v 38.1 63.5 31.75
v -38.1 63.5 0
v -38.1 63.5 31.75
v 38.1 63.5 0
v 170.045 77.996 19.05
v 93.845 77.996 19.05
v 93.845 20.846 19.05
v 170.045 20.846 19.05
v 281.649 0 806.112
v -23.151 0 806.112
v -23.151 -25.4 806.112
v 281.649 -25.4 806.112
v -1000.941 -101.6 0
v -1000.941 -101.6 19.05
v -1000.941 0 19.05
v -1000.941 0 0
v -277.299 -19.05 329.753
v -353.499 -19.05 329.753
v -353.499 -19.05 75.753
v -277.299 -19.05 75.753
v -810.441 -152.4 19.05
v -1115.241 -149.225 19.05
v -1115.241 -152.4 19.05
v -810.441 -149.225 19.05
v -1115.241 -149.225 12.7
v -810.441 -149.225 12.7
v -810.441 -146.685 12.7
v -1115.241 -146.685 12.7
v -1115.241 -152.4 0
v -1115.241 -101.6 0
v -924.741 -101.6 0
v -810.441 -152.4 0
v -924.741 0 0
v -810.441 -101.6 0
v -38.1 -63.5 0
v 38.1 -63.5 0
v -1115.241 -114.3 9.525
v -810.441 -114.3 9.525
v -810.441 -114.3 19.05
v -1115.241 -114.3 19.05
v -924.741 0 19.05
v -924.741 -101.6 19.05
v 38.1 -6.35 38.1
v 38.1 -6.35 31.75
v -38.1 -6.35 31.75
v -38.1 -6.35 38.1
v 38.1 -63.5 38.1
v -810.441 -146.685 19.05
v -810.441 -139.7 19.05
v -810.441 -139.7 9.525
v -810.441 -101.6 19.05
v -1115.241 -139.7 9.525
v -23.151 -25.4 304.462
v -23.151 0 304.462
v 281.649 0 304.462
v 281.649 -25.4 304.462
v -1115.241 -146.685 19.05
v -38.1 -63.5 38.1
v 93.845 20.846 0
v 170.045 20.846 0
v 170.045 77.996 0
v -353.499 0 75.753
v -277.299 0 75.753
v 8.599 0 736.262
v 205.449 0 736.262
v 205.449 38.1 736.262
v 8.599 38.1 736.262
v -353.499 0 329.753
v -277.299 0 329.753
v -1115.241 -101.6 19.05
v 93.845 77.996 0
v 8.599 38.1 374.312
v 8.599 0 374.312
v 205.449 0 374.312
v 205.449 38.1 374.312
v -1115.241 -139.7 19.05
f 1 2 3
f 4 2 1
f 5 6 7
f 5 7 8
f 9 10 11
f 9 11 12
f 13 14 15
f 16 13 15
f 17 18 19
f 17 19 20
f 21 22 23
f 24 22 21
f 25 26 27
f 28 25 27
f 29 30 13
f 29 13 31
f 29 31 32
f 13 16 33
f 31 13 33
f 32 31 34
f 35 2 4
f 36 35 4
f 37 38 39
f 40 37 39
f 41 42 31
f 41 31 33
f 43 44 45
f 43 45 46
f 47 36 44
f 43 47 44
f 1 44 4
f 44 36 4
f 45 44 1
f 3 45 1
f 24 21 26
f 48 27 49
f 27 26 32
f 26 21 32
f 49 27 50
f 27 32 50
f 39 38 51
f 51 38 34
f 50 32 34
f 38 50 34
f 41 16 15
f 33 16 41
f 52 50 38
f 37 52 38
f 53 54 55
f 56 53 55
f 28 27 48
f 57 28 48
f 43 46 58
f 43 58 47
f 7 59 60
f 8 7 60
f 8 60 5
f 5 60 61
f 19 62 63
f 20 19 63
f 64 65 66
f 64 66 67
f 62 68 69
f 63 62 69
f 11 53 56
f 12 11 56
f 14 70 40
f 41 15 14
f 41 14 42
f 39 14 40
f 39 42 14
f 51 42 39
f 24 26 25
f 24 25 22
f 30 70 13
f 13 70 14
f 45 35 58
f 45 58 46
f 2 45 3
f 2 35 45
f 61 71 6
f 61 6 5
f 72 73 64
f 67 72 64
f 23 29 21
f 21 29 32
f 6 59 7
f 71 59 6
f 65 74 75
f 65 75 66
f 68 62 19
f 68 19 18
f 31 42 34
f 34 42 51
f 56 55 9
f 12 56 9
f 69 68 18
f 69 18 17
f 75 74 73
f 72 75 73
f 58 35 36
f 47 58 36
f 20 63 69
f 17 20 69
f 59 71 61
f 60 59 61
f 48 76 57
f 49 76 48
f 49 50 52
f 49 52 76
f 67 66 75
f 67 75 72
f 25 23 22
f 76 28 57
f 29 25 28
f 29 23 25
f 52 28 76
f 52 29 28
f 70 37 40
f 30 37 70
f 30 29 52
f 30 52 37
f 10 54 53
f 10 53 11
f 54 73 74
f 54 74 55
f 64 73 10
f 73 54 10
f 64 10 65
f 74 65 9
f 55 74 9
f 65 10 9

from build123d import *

# Parameters (mm, degrees)
F0_W      = 76.2
F0_H      = 127
F1_DEPTH  = 38.1
F2_W      = 69.85
F2_H      = 6.35
F3_DEPTH  = 76.2
F4_DEPTH  = 76.2
F5_W      = 76.2
F5_H      = 57.15
F6_DEPTH  = 19.05
F7_W      = 304.8
F7_H      = 152.4
F8_DEPTH  = 19.05
F9_W      = 114.3
F9_H      = 101.6
F10_DEPTH = 19.05
F11_W     = 2.54
F11_H     = 6.35
F11_W_2   = 25.4
F11_H_2   = 9.525
F12_DEPTH = 304.8
F13_W     = 76.2
F13_H     = 254
F14_DEPTH = 19.05
F15_W     = 304.8
F15_H     = 501.65
F16_DEPTH = 25.4
F17_W     = 196.85
F17_H     = 361.95
F18_DEPTH = 38.1


with BuildPart() as f1:
    # F0 (on Top) → F1 (new body)
    with BuildSketch(Plane.XY):
        Rectangle(F0_W, F0_H)
    extrude(amount=F1_DEPTH)

    # F2 (on face) → F3 (join, through all)
    with BuildSketch(Plane.YZ.offset(38.1)):
        with Locations((28.575, 34.925)):
            Rectangle(F2_W, F2_H)
    extrude(amount=-F3_DEPTH)

    # F2 (on face) → F4 (cut, through all)
    with BuildSketch(Plane.YZ.offset(38.1)):
        with Locations((28.575, 34.925)):
            Rectangle(F2_W, F2_H)
    extrude(amount=-F4_DEPTH, mode=Mode.SUBTRACT)


with BuildPart() as f6:
    # F5 (on Top) → F6 (new body)
    with BuildSketch(Plane.XY):
        with Locations((131.945428, 49.421202)):
            Rectangle(F5_W, F5_H)
    extrude(amount=F6_DEPTH)


with BuildPart() as f8:
    # F7 (on Top) → F8 (new body)
    with BuildSketch(Plane.XY):
        with Locations((-962.84058, -76.2)):
            Rectangle(F7_W, F7_H)
    extrude(amount=F8_DEPTH)

    # F9 (on face) → F10 (cut, through all)
    with BuildSketch(Plane.XY.offset(19.05)):
        with Locations((-867.59058, -50.8)):
            Rectangle(F9_W, F9_H)
        with Locations((-1058.09058, -50.8)):
            Rectangle(F9_W, F9_H)
    extrude(amount=-F10_DEPTH, mode=Mode.SUBTRACT)

    # F11 (on face) → F12 (cut, through all)
    with BuildSketch(Plane.YZ.offset(-810.44058)):
        with Locations((-147.955, 15.875)):
            Rectangle(F11_W, F11_H)
        with Locations((-127, 14.2875)):
            Rectangle(F11_W_2, F11_H_2)
    extrude(amount=-F12_DEPTH, mode=Mode.SUBTRACT)


with BuildPart() as f14:
    # F13 (on Front) → F14 (new body)
    with BuildSketch(Plane.XZ):
        with Locations((-315.398529, 202.753096)):
            Rectangle(F13_W, F13_H)
    extrude(amount=F14_DEPTH)


with BuildPart() as f16:
    # F15 (on Front) → F16 (new body)
    with BuildSketch(Plane.XZ):
        with Locations((129.24853, 555.286902)):
            Rectangle(F15_W, F15_H)
    extrude(amount=F16_DEPTH)

    # F17 (on face) → F18 (join)
    with BuildSketch(Plane(origin=(0, 0, 0), x_dir=(-1, 0, 0), z_dir=(0, 1, 0))):
        with Locations((-107.02353, 555.286902)):
            Rectangle(F17_W, F17_H)
    extrude(amount=F18_DEPTH)


solid = Compound([f1.part, f6.part, f8.part, f14.part, f16.part])
